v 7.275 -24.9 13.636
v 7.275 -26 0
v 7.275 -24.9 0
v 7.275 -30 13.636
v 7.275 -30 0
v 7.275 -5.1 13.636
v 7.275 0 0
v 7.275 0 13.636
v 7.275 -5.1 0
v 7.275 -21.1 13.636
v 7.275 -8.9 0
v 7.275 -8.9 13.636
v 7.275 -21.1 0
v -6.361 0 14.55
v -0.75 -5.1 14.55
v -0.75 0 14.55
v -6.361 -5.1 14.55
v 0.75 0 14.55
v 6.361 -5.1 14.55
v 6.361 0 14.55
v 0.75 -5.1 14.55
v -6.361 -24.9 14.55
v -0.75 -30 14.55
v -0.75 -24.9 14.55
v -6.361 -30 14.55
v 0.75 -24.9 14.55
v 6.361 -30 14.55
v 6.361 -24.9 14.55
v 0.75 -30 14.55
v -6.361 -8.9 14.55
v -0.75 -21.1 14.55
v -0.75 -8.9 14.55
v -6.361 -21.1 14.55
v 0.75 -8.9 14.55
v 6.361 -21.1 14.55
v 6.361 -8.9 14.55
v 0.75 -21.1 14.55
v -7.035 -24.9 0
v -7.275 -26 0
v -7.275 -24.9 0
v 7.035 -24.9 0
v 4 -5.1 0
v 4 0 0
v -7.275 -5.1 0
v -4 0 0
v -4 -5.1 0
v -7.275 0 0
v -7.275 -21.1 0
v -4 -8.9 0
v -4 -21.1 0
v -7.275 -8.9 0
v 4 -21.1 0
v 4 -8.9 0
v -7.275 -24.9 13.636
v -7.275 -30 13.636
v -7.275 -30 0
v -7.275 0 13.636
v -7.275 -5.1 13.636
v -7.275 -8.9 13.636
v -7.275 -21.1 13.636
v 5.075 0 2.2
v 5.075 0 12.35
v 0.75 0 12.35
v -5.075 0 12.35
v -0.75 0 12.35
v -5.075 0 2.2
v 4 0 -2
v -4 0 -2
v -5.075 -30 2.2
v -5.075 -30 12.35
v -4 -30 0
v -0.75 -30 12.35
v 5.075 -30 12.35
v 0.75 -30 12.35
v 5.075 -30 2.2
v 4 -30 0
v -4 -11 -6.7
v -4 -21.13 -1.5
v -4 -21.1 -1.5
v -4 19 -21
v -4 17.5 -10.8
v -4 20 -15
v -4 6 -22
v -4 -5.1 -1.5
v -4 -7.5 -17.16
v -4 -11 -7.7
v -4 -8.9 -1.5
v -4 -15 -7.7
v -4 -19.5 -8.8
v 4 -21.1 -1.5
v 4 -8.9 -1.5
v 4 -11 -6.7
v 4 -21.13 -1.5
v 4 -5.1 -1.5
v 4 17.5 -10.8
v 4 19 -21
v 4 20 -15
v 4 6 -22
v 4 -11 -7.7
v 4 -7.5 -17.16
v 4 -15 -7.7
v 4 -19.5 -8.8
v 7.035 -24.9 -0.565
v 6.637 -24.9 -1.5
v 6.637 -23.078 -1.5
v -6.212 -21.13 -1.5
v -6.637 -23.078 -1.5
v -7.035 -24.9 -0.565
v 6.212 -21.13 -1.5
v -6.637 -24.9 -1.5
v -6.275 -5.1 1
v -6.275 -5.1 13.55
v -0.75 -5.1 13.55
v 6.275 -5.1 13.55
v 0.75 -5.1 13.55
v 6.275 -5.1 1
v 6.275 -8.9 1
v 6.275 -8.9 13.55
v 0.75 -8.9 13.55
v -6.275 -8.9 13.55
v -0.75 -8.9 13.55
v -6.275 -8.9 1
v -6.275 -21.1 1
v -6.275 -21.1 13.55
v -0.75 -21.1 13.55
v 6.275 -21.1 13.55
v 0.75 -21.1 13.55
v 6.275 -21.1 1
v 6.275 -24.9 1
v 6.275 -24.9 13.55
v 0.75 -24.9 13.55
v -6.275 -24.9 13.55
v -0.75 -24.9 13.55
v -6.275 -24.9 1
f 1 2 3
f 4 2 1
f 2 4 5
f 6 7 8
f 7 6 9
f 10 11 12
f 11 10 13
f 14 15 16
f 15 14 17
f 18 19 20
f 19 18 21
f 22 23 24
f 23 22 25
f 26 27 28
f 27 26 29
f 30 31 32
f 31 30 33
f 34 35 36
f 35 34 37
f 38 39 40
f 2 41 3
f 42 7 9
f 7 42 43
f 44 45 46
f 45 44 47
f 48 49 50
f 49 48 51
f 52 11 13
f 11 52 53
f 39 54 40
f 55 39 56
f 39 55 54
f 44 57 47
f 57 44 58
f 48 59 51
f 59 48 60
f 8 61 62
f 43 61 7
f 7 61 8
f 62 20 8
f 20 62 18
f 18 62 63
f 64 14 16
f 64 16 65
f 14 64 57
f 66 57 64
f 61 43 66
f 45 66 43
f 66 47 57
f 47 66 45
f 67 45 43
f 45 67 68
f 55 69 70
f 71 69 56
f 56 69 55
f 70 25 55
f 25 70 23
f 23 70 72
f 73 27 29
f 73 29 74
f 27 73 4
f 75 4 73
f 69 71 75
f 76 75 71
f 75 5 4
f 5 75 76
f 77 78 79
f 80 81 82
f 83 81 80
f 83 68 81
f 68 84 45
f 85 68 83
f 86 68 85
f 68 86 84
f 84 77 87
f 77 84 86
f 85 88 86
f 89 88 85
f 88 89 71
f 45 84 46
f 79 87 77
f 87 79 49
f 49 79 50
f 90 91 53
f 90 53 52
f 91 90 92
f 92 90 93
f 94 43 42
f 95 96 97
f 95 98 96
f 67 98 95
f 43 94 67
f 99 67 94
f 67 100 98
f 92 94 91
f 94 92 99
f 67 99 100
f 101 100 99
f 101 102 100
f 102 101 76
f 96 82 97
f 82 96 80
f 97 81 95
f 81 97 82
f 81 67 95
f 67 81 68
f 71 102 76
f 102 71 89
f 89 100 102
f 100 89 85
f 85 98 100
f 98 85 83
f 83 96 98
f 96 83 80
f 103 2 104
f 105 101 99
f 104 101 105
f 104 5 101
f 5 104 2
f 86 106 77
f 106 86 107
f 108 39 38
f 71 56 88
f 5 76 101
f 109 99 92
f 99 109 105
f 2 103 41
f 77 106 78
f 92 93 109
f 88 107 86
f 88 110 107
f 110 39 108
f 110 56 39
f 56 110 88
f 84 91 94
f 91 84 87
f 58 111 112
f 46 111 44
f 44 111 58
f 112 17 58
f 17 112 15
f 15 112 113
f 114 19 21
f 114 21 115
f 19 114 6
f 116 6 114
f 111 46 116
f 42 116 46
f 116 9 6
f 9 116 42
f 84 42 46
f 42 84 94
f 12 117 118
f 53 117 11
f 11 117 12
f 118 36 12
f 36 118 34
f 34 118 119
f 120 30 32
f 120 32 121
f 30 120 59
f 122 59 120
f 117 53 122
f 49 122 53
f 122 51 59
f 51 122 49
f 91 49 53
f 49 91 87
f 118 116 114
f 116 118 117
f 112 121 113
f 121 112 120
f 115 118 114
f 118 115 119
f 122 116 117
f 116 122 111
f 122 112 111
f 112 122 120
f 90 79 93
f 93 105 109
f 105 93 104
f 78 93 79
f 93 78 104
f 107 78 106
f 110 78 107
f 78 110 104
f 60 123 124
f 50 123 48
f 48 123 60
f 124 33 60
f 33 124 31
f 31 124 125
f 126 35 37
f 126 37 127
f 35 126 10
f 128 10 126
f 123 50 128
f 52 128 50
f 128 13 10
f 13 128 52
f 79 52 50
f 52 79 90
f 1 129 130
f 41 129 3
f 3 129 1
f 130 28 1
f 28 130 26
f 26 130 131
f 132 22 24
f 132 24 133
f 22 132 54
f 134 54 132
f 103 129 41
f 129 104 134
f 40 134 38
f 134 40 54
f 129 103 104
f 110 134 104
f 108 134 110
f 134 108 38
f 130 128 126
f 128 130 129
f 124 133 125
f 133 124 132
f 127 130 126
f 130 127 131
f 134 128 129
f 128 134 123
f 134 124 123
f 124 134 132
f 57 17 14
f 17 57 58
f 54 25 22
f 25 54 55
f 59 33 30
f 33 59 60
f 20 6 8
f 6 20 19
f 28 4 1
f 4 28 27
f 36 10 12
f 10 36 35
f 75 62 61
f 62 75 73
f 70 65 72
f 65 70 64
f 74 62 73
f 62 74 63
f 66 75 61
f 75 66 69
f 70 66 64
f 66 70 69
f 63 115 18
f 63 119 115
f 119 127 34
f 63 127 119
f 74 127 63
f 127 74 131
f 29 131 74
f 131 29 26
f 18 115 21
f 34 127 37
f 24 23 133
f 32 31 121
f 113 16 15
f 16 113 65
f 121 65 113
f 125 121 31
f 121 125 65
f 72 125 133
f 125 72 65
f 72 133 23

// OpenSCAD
// ===================================================================
// Project: OpenStickFPV
// Component: Monolithic Ramp-Blended Tail Skid for 10x10mm Spar
// - Front face forms a single continuous flat wedge from the front rim
//   (Y = -30mm) directly to the ground runner heel (zero undercut / step)
// - Runner extended rearward by 20mm past the collar rear (Y = +20mm)
// - Clean, geometric hull-based transitions with no separate floating lugs
// - Dual zip-tie retention channels and full longitudinal pinch slit
// - 100% support-free 3D printing (flat on side or inverted)
// ===================================================================

$fn = 60;

// --- Fuselage Spar Spec (10x10mm Square) ---
spar_width           = 10.15;  // 10x10mm spar (+0.15mm tolerance)
spar_height          = 10.15;  // 10x10mm spar height
sleeve_wall          = 2.2;    // Sleeve wall thickness
sleeve_length        = 30.0;   // Length along spar (Y spans -30mm to 0mm)

// --- Dual Zip-Tie Clamp Spec ---
ziptie_width         = 3.8;    // Fits standard 2.5mm to 3.5mm zip-ties
ziptie_depth         = 1.0;    // Groove depth
ziptie_positions_y   = [-7.0, -23.0]; // Clamping zones along the sleeve
slit_width           = 1.5;    // Top compression slit width

// --- Skid Geometry ---
skid_extension_rear  = 20.0;   // Extended 20mm rearward past Y = 0
skid_width           = 8.0;    // Thickness across X
skid_drop            = 22.0;   // Ground clearance drop below spar
skid_heel_radius     = 7.0;    // Rounded ground contact curvature

// Derived Dimensions
collar_w = spar_width + 2 * sleeve_wall;
collar_h = spar_height + 2 * sleeve_wall;

// 2D Profile: Pure monotonic ramp from the very front lip (Y = -30, Z = 0)
// down to the ground heel, completely eliminating any intermediate dip or gap.
module seamless_skid_profile() {
    polygon(points = [
        // 1. Front top corner (flush at sleeve forward edge)
        [-sleeve_length, 0],

        // 2. Continuous downward ramp along the belly directly to the ground shoe
        [-sleeve_length * 0.65, -skid_drop * 0.40],
        [-sleeve_length * 0.25, -skid_drop * 0.78],
        [skid_extension_rear - skid_heel_radius * 2, -skid_drop],

        // 3. Rounded rear ground-contact heel
        [skid_extension_rear - 1.0, -skid_drop + 1.0],
        [skid_extension_rear, -skid_drop + skid_heel_radius],
        [skid_extension_rear - 2.5, -skid_drop + skid_heel_radius * 1.6],

        // 4. Rear upward sweep meeting the rear edge of the sleeve
        [0, -2.0],
        [0, 0]
    ]);
}

module tail_skid_monolithic() {
    difference() {
        // -------------------------------------------------------------
        // 1. ADDITIVE SHAPES (Collar + Fully Integrated Monolithic Ramp)
        // -------------------------------------------------------------
        union() {
            // Main rectangular spar sleeve
            translate([-collar_w/2, -sleeve_length, 0])
                cube([collar_w, sleeve_length, collar_h]);

            // Ground runner extruded across skid_width and merged flush with collar
            translate([-skid_width/2, 0, 0])
                rotate([90, 0, 90])
                linear_extrude(height = skid_width)
                    seamless_skid_profile();

            // Flanking triangular gusset ramps blending the 8mm runner into the 14.5mm collar
            hull() {
                translate([-collar_w/2, -sleeve_length, 0])
                    cube([collar_w, 4.0, 1.0]);
                translate([-skid_width/2, -sleeve_length * 0.5, -skid_drop * 0.35])
                    cube([skid_width, 4.0, 1.0]);
            }
        }

        // -------------------------------------------------------------
        // 2. 10x10mm SPAR CAVITY
        // -------------------------------------------------------------
        translate([-spar_width/2, -sleeve_length - 1, sleeve_wall])
            cube([spar_width, sleeve_length + 2, spar_height]);

        // -------------------------------------------------------------
        // 3. DUAL ZIP-TIE RETENTION GROOVES
        // -------------------------------------------------------------
        for (pos_y = ziptie_positions_y) {
            translate([0, pos_y, collar_h/2])
                difference() {
                    cube([collar_w + 3, ziptie_width, collar_h + 3], center = true);
                    cube([
                        collar_w - 2 * ziptie_depth,
                        ziptie_width + 1,
                        collar_h - 2 * ziptie_depth
                    ], center = true);
                }
        }

        // -------------------------------------------------------------
        // 4. FULL-LENGTH LONGITUDINAL PINCH SLIT
        // -------------------------------------------------------------
        translate([-slit_width/2, -sleeve_length - 1, spar_height/2])
            cube([slit_width, sleeve_length + 2, collar_h]);

        // -------------------------------------------------------------
        // 5. SIDE PERIMETER BEVELS (Smooth Aerodynamic Edges)
        // -------------------------------------------------------------
        for (sx = [-1, 1]) {
            translate([sx * (collar_w/2 + 0.5), -sleeve_length/2, collar_h])
                rotate([0, 45, 0])
                cube([2.0, sleeve_length + 2, 2.0], center = true);
        }
    }
}

tail_skid_monolithic();
